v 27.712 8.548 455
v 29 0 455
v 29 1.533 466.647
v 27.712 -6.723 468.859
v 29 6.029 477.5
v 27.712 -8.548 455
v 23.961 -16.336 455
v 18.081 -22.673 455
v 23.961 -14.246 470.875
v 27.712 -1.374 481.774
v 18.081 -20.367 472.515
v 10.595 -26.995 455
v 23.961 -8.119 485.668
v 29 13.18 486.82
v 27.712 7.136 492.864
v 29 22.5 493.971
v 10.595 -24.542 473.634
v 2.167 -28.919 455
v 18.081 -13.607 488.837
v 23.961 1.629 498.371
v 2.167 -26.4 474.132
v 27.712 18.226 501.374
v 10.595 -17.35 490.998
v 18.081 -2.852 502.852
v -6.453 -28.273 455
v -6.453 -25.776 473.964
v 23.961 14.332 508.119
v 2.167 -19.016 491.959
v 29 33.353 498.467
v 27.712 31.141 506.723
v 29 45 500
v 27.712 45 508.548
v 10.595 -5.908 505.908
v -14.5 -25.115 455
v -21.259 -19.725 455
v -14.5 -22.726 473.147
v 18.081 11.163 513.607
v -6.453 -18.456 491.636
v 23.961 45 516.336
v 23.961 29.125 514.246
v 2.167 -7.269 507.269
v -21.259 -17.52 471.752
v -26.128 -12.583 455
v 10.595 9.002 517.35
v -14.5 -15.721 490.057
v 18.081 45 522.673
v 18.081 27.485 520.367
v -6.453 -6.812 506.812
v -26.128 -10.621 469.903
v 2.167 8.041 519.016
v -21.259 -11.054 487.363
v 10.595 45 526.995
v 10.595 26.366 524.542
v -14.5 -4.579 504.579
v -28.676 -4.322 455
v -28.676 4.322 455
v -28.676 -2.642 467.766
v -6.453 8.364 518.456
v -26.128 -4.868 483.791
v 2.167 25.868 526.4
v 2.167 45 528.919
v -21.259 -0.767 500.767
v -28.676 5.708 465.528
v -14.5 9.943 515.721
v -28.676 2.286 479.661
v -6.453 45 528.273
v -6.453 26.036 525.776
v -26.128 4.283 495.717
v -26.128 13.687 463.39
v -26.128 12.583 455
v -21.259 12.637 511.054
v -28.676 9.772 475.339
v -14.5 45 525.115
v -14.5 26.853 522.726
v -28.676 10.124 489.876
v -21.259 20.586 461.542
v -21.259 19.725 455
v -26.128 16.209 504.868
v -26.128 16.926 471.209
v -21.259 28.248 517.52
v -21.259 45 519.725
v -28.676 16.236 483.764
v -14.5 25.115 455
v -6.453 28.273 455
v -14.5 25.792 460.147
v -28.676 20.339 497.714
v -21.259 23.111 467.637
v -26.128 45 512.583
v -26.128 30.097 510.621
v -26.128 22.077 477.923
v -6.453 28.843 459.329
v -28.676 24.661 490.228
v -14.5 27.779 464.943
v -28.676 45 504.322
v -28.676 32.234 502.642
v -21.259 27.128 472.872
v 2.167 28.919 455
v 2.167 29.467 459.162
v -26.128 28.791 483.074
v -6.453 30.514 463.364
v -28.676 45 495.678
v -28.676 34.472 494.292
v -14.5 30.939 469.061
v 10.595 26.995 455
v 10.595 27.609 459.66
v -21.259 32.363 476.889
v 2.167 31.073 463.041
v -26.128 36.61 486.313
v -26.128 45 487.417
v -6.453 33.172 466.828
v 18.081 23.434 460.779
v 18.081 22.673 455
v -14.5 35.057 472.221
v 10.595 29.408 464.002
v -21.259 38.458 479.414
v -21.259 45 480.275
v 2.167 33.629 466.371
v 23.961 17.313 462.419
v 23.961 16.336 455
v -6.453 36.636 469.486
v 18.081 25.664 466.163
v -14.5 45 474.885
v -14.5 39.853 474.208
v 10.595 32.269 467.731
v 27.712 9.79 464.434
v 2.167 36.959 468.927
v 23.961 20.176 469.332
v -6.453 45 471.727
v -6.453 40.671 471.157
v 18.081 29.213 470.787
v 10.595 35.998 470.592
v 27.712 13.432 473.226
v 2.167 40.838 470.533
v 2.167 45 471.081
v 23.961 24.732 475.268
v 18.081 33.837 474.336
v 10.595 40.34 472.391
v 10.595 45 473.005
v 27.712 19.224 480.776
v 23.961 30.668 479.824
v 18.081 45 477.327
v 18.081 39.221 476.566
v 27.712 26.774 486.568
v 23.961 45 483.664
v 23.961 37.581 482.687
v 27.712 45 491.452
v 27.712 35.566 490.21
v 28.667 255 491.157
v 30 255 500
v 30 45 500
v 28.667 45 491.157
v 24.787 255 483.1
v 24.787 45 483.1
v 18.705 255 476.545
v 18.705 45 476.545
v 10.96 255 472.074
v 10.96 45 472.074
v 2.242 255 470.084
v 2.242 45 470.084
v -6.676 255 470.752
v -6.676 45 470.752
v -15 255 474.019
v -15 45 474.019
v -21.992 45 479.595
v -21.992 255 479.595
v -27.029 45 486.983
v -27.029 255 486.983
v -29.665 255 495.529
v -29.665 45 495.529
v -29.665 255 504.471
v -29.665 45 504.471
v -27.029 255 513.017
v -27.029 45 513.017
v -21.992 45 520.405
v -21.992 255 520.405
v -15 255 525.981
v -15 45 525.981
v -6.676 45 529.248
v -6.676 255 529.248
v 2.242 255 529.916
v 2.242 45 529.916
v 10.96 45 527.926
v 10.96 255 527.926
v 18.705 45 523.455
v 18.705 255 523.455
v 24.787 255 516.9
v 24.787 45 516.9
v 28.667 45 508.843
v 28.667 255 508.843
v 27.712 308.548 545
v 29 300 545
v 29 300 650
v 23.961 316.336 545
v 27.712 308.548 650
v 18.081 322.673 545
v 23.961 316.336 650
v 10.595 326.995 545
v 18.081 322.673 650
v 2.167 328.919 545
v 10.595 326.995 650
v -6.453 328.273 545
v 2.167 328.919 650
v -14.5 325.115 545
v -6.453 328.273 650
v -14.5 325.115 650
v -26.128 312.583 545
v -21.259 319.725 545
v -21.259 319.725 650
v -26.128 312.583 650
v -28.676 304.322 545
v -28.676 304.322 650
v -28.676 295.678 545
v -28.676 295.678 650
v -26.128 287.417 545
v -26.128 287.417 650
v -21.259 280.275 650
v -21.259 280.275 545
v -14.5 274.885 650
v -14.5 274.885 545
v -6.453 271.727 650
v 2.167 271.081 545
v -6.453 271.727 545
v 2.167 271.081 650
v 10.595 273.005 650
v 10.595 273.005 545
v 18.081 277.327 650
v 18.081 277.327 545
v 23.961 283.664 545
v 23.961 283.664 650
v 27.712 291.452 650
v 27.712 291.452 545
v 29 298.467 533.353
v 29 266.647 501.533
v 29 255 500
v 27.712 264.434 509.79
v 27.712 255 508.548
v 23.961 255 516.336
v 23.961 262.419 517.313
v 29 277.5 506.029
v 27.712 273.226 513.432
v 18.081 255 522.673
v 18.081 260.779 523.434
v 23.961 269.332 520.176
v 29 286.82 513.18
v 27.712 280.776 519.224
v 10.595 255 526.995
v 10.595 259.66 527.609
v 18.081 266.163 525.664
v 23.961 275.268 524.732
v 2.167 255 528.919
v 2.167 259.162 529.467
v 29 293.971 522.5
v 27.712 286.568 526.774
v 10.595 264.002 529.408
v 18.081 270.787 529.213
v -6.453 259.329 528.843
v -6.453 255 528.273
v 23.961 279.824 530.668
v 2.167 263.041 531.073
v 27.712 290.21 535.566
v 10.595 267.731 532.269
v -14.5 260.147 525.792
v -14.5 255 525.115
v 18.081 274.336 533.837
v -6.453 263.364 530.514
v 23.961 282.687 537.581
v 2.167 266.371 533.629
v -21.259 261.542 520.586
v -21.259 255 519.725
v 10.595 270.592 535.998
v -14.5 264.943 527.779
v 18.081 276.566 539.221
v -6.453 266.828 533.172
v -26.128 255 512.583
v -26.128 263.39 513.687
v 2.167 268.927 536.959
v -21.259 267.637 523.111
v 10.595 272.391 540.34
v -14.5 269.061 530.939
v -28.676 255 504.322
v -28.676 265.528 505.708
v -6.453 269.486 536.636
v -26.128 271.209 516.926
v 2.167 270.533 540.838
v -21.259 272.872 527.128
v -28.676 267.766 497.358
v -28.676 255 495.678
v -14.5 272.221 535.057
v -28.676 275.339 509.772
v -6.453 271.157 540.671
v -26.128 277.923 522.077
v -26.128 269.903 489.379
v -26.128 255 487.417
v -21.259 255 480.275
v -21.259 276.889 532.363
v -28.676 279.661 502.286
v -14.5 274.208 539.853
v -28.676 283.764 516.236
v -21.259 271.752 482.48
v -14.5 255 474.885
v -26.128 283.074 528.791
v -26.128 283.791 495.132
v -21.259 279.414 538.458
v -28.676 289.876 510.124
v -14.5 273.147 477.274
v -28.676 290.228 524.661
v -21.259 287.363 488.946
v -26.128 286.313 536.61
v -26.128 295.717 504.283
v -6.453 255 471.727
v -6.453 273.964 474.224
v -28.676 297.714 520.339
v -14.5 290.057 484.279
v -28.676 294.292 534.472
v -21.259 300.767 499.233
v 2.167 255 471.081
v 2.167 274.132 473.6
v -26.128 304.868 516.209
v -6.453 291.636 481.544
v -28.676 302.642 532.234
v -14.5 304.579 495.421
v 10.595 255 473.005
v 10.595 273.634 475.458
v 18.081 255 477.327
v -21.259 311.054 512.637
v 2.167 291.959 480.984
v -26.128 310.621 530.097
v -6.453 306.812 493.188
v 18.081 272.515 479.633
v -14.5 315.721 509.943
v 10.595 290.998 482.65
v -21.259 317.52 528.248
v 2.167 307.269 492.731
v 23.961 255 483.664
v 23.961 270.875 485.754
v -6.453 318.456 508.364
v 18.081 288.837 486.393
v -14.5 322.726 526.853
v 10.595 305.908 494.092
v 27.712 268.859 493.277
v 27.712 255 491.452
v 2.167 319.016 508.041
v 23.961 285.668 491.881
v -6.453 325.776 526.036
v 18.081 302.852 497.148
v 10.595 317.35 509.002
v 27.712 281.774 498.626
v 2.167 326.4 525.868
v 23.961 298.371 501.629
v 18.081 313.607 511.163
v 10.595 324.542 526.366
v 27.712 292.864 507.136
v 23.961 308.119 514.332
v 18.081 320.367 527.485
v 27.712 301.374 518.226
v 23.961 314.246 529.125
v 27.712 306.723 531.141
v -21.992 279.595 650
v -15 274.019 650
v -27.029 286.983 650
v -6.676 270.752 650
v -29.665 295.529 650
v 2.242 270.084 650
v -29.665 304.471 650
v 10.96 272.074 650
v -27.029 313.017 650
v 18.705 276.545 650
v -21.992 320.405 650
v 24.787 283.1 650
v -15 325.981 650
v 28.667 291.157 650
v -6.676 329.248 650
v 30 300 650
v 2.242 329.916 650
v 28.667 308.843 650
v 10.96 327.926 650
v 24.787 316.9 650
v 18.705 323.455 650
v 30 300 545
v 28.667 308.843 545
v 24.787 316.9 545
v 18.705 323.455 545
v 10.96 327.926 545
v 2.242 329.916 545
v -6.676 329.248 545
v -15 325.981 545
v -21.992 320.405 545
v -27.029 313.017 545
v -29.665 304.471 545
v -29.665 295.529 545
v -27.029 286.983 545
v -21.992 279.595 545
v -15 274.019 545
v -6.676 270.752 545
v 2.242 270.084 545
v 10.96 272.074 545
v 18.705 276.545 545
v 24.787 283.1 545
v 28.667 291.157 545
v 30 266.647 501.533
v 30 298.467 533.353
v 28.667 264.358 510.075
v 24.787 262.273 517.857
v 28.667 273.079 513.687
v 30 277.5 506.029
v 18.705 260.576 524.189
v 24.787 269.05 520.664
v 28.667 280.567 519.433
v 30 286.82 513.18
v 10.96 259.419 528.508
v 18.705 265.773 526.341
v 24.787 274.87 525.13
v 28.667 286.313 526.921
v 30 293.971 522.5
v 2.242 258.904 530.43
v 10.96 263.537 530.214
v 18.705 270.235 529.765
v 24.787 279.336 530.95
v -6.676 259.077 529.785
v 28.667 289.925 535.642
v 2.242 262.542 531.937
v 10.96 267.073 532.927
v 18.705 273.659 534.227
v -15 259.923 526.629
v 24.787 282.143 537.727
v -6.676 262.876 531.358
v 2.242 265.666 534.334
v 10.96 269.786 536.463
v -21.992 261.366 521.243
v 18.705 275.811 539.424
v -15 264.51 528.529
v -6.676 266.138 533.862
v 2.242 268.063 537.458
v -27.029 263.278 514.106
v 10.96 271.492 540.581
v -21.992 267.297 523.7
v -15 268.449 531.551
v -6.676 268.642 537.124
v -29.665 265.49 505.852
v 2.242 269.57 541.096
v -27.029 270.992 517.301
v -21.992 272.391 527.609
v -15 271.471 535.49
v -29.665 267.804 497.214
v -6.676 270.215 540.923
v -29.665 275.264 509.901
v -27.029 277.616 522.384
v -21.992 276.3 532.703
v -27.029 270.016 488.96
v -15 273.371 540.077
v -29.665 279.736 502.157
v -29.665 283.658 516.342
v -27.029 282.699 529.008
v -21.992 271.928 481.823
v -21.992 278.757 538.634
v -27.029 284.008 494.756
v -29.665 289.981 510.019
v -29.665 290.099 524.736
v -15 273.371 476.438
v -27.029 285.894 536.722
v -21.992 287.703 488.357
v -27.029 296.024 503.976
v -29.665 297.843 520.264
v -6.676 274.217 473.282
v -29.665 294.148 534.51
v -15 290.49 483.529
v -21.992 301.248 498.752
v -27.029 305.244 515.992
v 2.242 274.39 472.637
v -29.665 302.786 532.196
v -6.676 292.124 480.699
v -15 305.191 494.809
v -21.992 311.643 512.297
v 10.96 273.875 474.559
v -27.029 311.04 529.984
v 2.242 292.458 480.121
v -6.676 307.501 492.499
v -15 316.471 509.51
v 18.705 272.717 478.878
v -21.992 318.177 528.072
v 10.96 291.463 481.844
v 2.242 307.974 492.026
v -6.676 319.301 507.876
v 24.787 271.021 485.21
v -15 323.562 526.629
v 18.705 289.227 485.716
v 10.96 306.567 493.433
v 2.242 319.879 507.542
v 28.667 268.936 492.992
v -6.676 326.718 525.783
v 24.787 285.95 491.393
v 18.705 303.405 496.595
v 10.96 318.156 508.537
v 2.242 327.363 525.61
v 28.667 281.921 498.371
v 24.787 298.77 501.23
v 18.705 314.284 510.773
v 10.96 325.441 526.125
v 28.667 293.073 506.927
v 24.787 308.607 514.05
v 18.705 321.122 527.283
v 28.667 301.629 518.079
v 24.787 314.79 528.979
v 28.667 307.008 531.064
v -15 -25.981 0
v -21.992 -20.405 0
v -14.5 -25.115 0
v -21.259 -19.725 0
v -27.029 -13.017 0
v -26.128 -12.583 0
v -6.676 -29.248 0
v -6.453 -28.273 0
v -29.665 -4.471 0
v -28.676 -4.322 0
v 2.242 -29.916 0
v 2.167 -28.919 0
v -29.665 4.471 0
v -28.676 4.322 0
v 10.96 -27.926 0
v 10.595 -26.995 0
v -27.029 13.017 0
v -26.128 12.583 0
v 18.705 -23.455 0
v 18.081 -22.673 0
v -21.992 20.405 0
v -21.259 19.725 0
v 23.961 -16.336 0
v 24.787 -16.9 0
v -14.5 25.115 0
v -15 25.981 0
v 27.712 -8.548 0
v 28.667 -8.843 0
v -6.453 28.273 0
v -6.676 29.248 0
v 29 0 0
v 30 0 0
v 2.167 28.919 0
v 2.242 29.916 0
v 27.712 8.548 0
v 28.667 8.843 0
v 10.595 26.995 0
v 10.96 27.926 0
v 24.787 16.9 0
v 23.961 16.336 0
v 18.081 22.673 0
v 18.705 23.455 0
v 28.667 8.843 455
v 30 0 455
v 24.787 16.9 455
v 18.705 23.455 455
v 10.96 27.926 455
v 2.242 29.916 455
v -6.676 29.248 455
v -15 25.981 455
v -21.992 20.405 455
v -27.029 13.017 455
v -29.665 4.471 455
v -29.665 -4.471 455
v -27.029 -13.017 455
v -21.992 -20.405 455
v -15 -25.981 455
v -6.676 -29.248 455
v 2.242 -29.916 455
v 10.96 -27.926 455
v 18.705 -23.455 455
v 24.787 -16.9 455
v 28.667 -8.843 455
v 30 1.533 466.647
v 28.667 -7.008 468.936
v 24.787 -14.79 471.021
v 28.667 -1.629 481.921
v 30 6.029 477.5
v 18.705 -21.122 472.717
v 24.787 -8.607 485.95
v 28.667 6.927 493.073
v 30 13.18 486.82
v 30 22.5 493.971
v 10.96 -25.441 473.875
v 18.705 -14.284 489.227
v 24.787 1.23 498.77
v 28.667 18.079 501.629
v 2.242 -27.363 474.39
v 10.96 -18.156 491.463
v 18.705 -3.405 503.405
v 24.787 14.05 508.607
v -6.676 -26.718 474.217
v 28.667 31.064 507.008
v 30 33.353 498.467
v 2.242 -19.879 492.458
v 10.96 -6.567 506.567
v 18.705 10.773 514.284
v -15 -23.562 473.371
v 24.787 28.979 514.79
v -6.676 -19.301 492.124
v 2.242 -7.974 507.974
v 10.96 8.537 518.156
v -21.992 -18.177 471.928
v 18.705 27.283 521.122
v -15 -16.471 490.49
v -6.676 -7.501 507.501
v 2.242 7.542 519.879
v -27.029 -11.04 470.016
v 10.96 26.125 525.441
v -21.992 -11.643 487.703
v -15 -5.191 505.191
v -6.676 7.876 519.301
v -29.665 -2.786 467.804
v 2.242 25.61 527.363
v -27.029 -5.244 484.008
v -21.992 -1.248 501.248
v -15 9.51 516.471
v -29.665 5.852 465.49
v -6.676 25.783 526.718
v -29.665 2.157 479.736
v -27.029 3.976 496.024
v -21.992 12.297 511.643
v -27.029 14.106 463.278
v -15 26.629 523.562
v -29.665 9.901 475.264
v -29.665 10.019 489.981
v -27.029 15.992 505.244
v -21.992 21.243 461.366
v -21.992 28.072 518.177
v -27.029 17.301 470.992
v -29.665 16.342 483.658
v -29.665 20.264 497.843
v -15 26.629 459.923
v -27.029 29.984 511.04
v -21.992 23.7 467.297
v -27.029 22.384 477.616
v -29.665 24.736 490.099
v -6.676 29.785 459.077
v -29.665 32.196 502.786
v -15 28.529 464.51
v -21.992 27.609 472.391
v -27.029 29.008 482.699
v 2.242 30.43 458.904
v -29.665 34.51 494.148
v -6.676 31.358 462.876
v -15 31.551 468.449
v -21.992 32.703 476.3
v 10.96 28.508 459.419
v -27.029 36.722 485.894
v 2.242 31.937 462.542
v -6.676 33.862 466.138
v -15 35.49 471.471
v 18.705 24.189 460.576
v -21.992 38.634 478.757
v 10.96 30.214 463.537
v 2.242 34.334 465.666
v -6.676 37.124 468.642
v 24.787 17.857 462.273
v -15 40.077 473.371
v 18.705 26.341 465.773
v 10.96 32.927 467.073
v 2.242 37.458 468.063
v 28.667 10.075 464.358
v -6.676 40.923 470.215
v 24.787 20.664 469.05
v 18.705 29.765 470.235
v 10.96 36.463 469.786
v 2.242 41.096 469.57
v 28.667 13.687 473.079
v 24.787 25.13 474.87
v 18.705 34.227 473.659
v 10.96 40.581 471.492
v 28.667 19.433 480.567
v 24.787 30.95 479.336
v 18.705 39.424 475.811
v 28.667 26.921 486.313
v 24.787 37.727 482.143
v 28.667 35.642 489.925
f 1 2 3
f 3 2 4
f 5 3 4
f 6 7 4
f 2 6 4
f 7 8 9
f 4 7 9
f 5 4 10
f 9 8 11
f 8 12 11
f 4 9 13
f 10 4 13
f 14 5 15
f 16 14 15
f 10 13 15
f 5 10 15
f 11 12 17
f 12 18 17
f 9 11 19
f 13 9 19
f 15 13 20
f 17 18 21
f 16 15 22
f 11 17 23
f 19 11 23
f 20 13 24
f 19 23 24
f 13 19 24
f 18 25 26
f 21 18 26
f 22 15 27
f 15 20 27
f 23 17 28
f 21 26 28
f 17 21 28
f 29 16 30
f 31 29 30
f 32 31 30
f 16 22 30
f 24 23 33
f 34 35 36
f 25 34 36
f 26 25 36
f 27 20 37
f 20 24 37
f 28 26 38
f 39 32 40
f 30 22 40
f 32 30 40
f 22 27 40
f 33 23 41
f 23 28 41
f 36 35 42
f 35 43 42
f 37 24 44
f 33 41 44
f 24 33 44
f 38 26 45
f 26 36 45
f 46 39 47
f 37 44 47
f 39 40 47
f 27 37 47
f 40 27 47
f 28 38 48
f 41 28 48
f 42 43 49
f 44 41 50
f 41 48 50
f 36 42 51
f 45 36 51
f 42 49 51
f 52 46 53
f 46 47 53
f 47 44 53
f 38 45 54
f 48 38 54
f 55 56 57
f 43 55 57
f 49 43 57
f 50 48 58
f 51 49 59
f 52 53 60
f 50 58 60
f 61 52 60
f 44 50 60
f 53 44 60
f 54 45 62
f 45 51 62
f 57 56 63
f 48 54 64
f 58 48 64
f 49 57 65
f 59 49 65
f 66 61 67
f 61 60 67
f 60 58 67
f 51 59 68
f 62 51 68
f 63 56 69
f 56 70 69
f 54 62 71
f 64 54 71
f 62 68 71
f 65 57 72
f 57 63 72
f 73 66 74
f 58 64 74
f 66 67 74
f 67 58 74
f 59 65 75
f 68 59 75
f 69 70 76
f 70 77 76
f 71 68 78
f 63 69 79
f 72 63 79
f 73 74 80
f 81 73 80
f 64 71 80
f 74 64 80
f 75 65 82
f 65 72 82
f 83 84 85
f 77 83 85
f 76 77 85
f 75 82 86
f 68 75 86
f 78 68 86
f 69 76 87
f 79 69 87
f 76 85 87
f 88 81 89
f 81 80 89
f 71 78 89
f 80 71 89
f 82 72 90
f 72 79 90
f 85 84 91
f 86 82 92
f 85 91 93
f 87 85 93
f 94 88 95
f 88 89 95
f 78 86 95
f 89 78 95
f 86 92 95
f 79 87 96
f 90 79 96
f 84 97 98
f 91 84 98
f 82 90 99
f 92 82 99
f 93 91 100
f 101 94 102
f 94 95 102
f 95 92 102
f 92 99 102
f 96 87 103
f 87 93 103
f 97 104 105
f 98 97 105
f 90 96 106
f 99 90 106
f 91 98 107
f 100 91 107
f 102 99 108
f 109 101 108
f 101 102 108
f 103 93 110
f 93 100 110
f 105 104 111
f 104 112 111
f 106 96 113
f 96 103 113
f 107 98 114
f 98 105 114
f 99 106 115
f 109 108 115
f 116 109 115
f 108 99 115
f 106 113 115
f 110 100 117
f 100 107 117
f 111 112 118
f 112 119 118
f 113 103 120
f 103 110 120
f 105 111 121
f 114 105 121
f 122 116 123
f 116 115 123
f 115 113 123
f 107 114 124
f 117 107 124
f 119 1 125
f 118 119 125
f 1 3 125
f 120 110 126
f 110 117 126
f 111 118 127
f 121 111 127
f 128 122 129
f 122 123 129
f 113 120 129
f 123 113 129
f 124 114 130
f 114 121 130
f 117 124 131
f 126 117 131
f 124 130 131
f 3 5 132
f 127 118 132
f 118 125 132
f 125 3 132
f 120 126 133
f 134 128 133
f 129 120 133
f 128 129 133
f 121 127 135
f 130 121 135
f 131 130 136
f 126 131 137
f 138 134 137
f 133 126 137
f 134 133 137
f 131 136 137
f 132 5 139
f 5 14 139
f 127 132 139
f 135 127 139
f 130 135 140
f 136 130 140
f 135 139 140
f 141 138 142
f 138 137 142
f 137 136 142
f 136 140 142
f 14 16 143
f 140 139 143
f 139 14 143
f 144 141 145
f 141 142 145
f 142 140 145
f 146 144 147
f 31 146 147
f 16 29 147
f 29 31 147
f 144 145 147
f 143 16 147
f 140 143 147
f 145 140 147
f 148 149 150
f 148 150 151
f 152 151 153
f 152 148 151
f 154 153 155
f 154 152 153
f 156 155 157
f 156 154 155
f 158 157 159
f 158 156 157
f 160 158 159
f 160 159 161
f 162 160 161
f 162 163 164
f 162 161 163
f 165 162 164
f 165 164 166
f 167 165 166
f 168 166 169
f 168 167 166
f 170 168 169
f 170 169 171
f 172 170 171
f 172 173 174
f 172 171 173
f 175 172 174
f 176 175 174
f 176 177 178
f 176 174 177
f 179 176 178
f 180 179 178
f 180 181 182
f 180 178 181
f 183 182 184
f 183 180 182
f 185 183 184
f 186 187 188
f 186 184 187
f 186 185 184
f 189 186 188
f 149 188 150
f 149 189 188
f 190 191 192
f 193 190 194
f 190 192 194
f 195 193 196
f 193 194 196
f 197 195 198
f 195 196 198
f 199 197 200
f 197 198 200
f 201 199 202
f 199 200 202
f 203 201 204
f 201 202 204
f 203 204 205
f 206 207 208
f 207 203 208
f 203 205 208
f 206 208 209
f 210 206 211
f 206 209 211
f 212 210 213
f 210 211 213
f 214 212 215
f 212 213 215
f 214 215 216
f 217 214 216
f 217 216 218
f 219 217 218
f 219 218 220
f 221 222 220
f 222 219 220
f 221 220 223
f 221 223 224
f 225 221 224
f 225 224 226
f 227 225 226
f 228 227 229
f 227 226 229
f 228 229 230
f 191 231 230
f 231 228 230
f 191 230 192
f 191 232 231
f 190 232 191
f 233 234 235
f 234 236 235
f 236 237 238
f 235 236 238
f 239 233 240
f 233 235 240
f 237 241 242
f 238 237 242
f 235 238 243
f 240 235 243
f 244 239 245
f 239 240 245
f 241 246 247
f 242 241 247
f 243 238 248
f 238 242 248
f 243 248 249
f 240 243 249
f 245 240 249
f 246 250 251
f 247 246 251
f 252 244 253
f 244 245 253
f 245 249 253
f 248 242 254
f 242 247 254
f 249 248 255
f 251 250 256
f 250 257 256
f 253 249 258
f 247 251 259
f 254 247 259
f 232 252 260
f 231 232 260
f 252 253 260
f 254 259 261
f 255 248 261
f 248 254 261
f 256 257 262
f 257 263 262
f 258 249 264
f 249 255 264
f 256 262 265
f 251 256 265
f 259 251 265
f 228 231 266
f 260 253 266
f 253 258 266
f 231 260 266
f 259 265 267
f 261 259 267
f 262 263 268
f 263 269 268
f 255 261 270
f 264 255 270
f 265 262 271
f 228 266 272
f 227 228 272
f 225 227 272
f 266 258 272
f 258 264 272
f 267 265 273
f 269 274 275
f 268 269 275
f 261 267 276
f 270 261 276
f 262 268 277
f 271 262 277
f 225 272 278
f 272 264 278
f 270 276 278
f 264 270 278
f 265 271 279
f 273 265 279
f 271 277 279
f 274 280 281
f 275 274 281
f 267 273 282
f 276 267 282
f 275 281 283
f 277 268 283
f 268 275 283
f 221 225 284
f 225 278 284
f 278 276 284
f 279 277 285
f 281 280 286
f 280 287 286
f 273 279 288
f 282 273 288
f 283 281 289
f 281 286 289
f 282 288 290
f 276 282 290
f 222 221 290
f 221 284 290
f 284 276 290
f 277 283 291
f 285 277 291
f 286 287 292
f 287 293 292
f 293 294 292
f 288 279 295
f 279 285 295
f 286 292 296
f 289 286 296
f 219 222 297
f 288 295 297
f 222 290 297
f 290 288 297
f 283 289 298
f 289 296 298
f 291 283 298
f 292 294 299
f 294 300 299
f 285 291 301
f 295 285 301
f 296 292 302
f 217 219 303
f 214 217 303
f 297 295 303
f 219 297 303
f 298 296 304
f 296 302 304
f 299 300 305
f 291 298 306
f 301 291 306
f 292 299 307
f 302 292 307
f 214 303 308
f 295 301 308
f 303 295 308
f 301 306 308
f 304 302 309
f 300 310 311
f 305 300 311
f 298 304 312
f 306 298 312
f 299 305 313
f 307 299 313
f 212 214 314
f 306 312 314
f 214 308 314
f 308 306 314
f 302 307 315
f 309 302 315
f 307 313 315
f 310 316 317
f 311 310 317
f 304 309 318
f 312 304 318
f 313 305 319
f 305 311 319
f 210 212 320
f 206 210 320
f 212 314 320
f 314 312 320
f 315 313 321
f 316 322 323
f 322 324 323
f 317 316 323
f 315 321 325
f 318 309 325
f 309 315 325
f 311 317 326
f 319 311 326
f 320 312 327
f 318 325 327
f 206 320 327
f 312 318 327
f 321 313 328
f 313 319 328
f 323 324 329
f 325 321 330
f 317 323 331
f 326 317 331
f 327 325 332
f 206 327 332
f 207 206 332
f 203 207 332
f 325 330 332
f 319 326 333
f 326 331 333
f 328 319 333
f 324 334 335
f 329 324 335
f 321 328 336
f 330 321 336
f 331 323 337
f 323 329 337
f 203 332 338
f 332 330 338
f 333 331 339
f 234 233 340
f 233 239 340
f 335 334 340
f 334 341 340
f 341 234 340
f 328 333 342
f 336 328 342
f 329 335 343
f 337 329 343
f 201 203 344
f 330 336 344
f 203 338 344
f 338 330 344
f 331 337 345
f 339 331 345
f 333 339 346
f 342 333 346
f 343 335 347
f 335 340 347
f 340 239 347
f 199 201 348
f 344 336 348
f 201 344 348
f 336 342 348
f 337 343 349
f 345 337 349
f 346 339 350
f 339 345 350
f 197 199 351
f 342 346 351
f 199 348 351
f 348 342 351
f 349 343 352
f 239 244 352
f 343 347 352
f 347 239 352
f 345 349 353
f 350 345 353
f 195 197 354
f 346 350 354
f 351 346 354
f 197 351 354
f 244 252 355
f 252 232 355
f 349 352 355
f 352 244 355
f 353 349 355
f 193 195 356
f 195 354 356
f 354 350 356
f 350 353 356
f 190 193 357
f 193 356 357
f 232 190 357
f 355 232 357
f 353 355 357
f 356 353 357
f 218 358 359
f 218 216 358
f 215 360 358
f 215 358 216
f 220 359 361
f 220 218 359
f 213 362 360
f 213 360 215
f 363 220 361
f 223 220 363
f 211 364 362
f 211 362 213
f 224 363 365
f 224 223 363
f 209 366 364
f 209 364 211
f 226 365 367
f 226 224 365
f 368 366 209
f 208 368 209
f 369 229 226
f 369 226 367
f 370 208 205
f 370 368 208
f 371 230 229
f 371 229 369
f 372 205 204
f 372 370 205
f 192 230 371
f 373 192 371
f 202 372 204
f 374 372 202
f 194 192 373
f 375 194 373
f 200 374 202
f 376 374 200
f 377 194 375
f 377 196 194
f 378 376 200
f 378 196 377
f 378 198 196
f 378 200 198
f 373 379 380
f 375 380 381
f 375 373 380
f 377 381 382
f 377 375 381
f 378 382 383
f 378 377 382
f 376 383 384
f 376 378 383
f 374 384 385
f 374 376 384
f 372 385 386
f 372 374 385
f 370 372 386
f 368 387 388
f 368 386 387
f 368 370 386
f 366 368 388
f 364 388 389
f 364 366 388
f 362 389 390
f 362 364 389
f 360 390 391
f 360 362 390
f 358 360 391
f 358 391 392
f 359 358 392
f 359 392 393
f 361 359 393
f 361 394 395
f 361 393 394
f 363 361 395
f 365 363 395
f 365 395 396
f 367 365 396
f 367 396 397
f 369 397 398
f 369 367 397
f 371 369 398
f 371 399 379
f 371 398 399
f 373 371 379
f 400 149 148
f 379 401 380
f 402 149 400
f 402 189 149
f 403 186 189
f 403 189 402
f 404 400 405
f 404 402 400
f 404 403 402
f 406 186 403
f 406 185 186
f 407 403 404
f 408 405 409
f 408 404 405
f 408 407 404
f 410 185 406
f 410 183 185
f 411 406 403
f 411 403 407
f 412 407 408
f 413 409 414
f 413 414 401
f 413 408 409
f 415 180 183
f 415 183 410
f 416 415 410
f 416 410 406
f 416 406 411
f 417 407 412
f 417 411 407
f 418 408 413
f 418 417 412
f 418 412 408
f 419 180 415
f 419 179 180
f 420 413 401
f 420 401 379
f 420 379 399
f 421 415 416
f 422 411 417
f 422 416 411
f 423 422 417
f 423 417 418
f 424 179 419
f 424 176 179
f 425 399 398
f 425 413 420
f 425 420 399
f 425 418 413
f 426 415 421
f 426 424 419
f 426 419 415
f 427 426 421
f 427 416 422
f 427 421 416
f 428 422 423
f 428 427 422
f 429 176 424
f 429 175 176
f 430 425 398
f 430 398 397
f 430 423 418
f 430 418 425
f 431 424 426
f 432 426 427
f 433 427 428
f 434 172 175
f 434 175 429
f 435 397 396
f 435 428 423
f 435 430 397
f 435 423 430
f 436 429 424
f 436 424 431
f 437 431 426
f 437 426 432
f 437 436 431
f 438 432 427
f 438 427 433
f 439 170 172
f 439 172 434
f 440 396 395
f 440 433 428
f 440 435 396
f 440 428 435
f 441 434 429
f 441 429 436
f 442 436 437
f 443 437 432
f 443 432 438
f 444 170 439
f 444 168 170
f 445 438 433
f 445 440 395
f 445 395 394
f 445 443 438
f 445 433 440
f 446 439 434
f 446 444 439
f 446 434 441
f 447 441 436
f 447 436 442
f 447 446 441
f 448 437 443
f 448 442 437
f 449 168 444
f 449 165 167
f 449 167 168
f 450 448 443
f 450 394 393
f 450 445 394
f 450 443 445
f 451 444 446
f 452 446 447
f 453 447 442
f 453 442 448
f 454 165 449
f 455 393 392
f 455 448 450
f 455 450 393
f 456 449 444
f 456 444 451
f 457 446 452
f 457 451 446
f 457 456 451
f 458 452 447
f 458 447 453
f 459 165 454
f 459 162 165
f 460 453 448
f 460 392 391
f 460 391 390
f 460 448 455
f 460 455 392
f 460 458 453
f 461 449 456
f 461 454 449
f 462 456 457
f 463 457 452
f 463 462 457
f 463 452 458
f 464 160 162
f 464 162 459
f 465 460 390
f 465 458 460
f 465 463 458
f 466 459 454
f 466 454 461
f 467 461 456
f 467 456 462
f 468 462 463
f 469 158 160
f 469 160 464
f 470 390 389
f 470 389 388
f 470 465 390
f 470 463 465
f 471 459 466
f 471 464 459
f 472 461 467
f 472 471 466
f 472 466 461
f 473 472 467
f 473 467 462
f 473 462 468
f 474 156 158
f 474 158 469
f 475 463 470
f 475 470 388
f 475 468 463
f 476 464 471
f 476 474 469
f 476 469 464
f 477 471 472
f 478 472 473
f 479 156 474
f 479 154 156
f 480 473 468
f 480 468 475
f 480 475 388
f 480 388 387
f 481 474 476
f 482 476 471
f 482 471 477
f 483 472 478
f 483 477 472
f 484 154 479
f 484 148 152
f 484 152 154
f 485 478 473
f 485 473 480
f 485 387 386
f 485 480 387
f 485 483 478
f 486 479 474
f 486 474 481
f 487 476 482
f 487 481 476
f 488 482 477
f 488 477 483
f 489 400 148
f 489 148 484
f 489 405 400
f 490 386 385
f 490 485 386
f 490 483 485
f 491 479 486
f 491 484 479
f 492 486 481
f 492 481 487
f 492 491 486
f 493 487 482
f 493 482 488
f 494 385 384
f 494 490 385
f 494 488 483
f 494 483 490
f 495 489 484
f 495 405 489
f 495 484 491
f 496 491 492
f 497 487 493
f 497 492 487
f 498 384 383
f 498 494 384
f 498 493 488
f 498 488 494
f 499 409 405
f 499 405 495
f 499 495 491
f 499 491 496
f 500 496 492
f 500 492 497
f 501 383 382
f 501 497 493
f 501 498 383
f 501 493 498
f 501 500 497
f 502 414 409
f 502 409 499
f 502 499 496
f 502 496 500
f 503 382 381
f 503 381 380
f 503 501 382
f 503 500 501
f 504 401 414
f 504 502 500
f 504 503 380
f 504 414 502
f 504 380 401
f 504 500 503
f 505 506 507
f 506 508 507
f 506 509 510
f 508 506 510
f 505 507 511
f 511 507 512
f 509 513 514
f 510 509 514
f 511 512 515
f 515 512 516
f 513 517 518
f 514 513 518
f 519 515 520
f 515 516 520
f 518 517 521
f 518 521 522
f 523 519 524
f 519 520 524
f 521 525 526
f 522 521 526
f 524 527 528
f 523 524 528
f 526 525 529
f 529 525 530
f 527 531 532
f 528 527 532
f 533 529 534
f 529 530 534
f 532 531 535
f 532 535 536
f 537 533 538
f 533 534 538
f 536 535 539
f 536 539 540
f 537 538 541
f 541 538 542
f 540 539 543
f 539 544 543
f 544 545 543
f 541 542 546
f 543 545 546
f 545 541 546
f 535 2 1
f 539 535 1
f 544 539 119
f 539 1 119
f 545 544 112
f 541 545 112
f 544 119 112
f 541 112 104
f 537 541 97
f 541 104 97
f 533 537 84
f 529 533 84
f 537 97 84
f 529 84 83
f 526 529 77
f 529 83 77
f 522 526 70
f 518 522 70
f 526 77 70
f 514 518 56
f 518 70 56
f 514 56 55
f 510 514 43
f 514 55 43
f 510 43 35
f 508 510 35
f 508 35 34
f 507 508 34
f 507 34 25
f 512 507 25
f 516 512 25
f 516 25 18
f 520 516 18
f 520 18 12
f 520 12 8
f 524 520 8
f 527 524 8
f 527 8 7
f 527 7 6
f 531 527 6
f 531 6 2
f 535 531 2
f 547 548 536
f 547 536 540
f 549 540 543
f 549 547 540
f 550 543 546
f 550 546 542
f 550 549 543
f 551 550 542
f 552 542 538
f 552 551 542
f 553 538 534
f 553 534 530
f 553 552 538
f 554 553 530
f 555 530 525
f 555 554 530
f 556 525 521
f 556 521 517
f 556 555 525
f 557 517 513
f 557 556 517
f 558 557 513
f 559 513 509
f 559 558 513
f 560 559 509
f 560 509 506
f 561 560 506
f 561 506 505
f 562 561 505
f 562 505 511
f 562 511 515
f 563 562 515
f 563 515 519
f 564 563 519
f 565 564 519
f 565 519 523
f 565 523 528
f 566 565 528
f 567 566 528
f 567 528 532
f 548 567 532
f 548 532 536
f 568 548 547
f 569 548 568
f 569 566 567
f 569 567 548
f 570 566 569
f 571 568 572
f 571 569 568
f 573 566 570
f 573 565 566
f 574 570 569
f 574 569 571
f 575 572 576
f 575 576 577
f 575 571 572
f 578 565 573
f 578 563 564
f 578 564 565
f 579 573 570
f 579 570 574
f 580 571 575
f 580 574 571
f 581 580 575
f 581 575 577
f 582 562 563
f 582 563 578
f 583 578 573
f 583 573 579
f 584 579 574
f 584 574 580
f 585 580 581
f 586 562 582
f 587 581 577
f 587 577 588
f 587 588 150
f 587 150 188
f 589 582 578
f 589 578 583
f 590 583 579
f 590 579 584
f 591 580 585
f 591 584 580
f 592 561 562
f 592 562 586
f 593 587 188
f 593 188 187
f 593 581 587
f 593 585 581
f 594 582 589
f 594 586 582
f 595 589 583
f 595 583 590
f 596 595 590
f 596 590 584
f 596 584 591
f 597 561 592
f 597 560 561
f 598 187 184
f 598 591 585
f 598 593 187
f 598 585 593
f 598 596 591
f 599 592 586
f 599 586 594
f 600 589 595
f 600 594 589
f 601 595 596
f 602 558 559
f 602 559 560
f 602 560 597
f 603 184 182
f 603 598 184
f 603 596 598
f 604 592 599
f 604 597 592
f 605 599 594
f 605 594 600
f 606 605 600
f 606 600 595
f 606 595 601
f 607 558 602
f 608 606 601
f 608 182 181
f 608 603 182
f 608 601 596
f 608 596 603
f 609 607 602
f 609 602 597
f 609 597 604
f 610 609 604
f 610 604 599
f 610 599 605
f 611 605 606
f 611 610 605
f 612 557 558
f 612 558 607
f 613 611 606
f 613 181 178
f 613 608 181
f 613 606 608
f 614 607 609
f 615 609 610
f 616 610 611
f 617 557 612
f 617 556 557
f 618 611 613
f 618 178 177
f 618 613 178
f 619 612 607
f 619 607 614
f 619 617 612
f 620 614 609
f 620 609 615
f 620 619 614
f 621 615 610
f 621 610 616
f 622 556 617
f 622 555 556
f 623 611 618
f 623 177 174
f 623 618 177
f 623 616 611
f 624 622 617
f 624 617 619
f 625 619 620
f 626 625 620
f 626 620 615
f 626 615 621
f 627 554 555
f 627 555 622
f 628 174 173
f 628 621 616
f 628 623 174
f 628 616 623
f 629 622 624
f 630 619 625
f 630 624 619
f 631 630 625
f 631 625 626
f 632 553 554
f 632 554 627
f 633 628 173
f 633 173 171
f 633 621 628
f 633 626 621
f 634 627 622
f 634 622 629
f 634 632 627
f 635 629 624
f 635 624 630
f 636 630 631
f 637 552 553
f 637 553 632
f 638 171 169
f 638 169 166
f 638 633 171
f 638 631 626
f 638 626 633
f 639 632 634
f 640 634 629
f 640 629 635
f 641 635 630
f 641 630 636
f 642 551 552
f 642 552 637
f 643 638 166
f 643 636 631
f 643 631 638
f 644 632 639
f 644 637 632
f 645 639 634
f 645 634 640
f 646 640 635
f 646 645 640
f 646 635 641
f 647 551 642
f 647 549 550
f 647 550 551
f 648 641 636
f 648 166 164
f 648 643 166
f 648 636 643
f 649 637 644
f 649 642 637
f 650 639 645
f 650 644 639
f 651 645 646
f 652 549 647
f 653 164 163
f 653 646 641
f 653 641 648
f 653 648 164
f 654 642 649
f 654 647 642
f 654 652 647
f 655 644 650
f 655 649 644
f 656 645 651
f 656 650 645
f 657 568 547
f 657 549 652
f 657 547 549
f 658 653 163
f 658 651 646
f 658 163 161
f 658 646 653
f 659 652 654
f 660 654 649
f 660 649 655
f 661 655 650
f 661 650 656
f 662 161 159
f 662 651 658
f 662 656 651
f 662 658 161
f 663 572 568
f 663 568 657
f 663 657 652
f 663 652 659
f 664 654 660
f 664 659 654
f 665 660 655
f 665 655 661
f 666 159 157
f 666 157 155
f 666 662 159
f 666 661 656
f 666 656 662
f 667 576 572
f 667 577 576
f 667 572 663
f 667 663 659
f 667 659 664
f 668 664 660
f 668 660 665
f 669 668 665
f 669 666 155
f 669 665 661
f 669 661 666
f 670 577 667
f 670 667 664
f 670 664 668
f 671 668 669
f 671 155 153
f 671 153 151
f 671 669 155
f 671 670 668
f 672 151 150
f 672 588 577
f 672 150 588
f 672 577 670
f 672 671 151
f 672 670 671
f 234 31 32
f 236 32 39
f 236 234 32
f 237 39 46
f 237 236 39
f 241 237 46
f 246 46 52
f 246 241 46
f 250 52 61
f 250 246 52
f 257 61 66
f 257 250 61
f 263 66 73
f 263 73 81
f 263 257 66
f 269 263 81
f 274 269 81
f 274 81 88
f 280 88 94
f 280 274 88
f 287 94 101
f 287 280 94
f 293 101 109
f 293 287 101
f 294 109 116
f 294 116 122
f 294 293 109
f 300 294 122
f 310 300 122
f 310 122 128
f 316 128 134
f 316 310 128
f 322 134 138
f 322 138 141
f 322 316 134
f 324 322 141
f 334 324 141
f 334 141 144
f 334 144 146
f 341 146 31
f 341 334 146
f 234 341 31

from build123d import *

# Parameters (mm, degrees)
F1_R   = 30
F1_R_2 = 29


with BuildPart() as f2:
    # F2: sweep along a path in F0
    with BuildLine(Plane.YZ) as f2_path:
        Line((0, 0), (0, 455))
        ThreePointArc((0, 455), (13.180195, 486.819805), (45, 500))
        Line((45, 500), (255, 500))
        ThreePointArc((255, 500), (286.819805, 513.180195), (300, 545))
        Line((300, 545), (300, 650))
    # F1 (on Top) → F2 (sweep)
    with BuildSketch(Plane.XY):
        Circle(F1_R)
        Circle(F1_R_2, mode=Mode.SUBTRACT)
    sweep(path=f2_path.line)


solid = f2.part
